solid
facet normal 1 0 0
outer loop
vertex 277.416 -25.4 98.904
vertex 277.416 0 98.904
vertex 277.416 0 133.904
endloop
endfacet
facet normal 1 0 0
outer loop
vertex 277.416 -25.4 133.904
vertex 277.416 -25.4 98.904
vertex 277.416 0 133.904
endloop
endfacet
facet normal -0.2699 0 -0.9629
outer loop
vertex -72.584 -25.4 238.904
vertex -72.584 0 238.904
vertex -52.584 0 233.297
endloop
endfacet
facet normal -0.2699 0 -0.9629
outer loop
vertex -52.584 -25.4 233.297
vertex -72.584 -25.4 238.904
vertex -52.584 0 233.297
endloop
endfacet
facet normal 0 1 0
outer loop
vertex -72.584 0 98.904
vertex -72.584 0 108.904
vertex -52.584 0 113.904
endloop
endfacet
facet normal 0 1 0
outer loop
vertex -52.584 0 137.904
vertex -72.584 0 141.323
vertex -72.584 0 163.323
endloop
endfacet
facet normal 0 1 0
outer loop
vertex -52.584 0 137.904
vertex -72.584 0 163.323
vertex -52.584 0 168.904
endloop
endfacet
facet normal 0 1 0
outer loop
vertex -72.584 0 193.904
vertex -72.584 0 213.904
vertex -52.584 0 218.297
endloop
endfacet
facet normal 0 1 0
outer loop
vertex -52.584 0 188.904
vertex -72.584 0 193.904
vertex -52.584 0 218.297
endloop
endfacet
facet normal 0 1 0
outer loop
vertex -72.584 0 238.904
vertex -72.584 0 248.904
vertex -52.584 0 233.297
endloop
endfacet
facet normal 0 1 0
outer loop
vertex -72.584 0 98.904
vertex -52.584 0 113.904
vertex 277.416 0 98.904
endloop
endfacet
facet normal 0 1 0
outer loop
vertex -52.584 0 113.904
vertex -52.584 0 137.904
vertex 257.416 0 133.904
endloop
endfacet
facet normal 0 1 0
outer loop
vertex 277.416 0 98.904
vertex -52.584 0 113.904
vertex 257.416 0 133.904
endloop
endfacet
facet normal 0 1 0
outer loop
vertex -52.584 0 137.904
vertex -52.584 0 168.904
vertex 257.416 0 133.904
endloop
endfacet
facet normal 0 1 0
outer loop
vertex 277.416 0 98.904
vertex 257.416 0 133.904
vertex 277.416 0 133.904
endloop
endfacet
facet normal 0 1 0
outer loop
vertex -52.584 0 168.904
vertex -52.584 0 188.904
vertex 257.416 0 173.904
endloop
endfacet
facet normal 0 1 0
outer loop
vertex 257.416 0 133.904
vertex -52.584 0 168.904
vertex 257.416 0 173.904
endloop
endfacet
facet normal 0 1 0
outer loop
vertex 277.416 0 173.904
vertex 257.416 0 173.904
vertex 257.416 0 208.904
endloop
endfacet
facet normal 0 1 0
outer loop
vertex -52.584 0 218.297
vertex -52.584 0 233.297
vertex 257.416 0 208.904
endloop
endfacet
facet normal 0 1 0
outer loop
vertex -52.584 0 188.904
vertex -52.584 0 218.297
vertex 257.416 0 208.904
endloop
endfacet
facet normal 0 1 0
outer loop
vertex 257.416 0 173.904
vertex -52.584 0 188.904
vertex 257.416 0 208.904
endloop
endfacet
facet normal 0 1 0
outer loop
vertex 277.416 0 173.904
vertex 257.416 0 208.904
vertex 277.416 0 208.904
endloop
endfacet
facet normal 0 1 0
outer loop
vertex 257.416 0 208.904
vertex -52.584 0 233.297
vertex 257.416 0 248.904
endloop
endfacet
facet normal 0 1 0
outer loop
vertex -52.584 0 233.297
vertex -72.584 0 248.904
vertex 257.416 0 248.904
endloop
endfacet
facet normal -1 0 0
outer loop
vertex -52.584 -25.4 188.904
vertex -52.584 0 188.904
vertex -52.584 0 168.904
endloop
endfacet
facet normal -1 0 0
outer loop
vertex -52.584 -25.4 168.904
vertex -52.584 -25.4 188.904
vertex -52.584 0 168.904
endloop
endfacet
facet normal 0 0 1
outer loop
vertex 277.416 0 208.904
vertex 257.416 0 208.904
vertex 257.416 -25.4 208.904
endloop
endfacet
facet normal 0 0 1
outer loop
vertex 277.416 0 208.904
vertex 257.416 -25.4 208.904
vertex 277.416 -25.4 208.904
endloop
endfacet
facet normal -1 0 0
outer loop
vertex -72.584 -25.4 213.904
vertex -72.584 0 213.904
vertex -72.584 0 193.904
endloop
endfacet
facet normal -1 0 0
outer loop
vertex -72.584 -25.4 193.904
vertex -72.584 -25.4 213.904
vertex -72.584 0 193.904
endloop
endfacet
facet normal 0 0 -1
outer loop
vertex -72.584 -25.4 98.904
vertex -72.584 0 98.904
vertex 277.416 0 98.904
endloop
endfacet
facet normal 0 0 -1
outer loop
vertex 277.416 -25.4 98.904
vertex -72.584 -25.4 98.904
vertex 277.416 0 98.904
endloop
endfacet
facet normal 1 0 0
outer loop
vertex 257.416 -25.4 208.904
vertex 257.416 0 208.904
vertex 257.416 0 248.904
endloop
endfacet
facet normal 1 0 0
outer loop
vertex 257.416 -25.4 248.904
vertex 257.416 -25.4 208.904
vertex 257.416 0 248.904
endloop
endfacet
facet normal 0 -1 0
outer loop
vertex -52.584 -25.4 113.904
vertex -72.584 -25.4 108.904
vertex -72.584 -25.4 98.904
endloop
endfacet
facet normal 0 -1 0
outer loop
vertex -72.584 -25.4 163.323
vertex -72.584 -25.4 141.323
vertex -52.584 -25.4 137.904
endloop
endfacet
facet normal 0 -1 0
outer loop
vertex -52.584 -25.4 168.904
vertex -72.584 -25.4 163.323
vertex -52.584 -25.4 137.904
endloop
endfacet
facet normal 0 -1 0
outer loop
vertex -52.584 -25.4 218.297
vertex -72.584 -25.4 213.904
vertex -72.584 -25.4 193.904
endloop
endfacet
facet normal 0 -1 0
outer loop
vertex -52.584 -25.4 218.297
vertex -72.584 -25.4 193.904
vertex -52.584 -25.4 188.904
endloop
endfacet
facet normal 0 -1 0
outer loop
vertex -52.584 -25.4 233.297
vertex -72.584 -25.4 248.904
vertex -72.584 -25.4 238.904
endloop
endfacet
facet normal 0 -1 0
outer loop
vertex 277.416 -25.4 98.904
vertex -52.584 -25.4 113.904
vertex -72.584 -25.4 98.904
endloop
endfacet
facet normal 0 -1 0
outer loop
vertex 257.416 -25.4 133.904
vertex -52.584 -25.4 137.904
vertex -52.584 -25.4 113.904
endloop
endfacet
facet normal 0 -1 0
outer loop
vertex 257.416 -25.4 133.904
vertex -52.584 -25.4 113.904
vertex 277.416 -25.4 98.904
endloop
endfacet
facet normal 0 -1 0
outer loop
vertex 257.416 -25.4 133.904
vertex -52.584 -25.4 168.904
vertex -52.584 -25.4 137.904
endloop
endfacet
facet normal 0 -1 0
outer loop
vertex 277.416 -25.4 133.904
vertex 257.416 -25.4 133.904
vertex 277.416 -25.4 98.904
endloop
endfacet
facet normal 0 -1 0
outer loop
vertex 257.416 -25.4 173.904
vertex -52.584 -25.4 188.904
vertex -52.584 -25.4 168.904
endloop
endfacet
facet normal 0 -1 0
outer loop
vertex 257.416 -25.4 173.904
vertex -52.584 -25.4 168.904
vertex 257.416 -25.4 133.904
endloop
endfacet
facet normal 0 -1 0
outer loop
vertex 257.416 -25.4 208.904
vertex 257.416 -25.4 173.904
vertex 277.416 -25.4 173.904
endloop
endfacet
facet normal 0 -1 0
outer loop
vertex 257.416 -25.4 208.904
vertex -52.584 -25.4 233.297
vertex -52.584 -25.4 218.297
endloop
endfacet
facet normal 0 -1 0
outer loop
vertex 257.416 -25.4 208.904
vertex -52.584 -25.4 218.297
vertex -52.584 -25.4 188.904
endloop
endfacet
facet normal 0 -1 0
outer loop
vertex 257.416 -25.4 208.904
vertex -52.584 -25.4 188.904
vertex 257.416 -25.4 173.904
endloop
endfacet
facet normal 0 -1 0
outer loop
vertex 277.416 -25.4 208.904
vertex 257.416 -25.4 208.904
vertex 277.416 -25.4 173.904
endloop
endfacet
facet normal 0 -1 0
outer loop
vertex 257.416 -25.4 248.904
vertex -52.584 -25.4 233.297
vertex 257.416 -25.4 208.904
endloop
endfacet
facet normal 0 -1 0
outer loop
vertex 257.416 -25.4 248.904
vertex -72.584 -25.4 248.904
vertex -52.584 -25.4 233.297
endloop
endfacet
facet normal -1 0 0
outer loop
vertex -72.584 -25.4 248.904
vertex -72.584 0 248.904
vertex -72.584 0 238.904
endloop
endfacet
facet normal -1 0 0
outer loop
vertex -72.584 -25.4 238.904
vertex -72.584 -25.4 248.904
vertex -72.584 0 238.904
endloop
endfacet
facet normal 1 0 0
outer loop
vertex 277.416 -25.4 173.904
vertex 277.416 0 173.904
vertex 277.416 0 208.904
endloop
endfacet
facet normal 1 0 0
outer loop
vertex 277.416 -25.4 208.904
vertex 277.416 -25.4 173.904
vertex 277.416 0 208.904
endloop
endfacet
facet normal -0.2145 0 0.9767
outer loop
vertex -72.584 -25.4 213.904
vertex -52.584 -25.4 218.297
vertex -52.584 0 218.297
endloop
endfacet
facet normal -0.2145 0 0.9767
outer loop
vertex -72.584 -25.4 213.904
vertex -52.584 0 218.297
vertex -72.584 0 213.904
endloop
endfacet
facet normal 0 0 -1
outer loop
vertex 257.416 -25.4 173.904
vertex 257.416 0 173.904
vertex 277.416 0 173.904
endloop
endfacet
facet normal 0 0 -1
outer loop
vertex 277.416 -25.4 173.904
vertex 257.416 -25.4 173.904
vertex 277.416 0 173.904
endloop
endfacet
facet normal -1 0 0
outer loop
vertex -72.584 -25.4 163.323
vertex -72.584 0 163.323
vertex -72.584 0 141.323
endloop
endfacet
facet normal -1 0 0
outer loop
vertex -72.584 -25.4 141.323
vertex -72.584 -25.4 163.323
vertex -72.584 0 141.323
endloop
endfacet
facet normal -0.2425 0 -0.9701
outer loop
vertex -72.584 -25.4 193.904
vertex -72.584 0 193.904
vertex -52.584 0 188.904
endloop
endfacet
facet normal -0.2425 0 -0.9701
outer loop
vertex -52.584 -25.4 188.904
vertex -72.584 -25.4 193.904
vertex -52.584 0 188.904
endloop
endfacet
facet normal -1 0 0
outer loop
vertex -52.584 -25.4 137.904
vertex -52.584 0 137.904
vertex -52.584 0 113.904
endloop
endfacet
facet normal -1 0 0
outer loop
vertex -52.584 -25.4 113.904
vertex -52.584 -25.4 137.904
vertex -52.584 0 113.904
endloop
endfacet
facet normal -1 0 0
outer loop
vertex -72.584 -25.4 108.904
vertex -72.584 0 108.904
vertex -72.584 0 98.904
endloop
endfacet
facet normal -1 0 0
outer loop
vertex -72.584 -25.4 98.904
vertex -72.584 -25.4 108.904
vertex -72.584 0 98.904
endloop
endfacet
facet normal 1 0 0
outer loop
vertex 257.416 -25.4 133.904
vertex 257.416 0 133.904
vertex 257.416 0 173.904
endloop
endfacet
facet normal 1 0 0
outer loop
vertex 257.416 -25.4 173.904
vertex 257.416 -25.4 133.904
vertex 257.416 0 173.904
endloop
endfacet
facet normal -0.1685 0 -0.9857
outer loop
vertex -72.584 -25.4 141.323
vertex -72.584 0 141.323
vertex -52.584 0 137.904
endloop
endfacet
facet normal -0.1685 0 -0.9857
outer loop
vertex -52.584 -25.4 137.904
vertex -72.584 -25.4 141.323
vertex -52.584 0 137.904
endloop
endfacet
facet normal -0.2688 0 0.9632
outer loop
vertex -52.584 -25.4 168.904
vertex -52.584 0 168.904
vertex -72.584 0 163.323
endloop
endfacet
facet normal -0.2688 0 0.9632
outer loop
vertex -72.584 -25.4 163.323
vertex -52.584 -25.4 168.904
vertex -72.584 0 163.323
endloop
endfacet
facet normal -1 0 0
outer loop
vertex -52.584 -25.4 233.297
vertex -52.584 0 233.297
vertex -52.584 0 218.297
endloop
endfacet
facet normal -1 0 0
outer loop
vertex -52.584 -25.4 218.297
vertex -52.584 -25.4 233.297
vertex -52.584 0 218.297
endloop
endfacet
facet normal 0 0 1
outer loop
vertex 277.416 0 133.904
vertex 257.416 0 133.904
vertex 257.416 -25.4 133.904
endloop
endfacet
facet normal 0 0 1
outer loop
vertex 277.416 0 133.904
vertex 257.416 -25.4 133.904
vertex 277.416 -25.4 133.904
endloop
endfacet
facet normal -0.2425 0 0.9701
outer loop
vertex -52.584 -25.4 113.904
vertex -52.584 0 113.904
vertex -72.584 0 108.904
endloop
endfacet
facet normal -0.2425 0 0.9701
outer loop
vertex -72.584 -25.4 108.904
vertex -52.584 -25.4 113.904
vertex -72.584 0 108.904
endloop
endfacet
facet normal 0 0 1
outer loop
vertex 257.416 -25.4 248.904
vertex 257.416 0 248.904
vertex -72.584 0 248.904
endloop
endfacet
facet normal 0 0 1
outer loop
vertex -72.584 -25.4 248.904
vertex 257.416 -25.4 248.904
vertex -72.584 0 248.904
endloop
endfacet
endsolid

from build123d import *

# Parameters (mm, degrees)
F0_W     = 20
F0_H     = 35
F1_DEPTH = 25.4


with BuildPart() as f1:
    # F0 (on Front) → F1 (new body)
    with BuildSketch(Plane.XZ):
        Polygon((-72.583798, 108.904224), (-72.583798, 98.904224), (-52.583798, 98.904224), (-52.583798, 113.904224), align=None)
        Polygon((-52.583798, 113.904224), (-52.583798, 98.904224), (257.416202, 98.904224), (257.416202, 133.904224), (257.416202, 173.904224), (257.416202, 208.904224), (257.416202, 248.904224), (-52.583798, 248.904224), (-52.583798, 233.297413), (-52.583798, 218.297413), (-52.583798, 188.904224), (-52.583798, 168.904224), (-52.583798, 137.904224), align=None)
        with Locations((267.416202, 116.404224)):
            Rectangle(F0_W, F0_H)
        Polygon((-72.583798, 141.323209), (-52.583798, 137.904224), (-52.583798, 168.904224), (-72.583798, 163.323209), align=None)
        with Locations((267.416202, 191.404224)):
            Rectangle(F0_W, F0_H)
        Polygon((-72.583798, 193.904224), (-52.583798, 188.904224), (-52.583798, 218.297413), (-72.583798, 213.904224), align=None)
        Polygon((-52.583798, 233.297413), (-52.583798, 248.904224), (-72.583798, 248.904224), (-72.583798, 238.904224), align=None)
    extrude(amount=F1_DEPTH)


solid = f1.part
